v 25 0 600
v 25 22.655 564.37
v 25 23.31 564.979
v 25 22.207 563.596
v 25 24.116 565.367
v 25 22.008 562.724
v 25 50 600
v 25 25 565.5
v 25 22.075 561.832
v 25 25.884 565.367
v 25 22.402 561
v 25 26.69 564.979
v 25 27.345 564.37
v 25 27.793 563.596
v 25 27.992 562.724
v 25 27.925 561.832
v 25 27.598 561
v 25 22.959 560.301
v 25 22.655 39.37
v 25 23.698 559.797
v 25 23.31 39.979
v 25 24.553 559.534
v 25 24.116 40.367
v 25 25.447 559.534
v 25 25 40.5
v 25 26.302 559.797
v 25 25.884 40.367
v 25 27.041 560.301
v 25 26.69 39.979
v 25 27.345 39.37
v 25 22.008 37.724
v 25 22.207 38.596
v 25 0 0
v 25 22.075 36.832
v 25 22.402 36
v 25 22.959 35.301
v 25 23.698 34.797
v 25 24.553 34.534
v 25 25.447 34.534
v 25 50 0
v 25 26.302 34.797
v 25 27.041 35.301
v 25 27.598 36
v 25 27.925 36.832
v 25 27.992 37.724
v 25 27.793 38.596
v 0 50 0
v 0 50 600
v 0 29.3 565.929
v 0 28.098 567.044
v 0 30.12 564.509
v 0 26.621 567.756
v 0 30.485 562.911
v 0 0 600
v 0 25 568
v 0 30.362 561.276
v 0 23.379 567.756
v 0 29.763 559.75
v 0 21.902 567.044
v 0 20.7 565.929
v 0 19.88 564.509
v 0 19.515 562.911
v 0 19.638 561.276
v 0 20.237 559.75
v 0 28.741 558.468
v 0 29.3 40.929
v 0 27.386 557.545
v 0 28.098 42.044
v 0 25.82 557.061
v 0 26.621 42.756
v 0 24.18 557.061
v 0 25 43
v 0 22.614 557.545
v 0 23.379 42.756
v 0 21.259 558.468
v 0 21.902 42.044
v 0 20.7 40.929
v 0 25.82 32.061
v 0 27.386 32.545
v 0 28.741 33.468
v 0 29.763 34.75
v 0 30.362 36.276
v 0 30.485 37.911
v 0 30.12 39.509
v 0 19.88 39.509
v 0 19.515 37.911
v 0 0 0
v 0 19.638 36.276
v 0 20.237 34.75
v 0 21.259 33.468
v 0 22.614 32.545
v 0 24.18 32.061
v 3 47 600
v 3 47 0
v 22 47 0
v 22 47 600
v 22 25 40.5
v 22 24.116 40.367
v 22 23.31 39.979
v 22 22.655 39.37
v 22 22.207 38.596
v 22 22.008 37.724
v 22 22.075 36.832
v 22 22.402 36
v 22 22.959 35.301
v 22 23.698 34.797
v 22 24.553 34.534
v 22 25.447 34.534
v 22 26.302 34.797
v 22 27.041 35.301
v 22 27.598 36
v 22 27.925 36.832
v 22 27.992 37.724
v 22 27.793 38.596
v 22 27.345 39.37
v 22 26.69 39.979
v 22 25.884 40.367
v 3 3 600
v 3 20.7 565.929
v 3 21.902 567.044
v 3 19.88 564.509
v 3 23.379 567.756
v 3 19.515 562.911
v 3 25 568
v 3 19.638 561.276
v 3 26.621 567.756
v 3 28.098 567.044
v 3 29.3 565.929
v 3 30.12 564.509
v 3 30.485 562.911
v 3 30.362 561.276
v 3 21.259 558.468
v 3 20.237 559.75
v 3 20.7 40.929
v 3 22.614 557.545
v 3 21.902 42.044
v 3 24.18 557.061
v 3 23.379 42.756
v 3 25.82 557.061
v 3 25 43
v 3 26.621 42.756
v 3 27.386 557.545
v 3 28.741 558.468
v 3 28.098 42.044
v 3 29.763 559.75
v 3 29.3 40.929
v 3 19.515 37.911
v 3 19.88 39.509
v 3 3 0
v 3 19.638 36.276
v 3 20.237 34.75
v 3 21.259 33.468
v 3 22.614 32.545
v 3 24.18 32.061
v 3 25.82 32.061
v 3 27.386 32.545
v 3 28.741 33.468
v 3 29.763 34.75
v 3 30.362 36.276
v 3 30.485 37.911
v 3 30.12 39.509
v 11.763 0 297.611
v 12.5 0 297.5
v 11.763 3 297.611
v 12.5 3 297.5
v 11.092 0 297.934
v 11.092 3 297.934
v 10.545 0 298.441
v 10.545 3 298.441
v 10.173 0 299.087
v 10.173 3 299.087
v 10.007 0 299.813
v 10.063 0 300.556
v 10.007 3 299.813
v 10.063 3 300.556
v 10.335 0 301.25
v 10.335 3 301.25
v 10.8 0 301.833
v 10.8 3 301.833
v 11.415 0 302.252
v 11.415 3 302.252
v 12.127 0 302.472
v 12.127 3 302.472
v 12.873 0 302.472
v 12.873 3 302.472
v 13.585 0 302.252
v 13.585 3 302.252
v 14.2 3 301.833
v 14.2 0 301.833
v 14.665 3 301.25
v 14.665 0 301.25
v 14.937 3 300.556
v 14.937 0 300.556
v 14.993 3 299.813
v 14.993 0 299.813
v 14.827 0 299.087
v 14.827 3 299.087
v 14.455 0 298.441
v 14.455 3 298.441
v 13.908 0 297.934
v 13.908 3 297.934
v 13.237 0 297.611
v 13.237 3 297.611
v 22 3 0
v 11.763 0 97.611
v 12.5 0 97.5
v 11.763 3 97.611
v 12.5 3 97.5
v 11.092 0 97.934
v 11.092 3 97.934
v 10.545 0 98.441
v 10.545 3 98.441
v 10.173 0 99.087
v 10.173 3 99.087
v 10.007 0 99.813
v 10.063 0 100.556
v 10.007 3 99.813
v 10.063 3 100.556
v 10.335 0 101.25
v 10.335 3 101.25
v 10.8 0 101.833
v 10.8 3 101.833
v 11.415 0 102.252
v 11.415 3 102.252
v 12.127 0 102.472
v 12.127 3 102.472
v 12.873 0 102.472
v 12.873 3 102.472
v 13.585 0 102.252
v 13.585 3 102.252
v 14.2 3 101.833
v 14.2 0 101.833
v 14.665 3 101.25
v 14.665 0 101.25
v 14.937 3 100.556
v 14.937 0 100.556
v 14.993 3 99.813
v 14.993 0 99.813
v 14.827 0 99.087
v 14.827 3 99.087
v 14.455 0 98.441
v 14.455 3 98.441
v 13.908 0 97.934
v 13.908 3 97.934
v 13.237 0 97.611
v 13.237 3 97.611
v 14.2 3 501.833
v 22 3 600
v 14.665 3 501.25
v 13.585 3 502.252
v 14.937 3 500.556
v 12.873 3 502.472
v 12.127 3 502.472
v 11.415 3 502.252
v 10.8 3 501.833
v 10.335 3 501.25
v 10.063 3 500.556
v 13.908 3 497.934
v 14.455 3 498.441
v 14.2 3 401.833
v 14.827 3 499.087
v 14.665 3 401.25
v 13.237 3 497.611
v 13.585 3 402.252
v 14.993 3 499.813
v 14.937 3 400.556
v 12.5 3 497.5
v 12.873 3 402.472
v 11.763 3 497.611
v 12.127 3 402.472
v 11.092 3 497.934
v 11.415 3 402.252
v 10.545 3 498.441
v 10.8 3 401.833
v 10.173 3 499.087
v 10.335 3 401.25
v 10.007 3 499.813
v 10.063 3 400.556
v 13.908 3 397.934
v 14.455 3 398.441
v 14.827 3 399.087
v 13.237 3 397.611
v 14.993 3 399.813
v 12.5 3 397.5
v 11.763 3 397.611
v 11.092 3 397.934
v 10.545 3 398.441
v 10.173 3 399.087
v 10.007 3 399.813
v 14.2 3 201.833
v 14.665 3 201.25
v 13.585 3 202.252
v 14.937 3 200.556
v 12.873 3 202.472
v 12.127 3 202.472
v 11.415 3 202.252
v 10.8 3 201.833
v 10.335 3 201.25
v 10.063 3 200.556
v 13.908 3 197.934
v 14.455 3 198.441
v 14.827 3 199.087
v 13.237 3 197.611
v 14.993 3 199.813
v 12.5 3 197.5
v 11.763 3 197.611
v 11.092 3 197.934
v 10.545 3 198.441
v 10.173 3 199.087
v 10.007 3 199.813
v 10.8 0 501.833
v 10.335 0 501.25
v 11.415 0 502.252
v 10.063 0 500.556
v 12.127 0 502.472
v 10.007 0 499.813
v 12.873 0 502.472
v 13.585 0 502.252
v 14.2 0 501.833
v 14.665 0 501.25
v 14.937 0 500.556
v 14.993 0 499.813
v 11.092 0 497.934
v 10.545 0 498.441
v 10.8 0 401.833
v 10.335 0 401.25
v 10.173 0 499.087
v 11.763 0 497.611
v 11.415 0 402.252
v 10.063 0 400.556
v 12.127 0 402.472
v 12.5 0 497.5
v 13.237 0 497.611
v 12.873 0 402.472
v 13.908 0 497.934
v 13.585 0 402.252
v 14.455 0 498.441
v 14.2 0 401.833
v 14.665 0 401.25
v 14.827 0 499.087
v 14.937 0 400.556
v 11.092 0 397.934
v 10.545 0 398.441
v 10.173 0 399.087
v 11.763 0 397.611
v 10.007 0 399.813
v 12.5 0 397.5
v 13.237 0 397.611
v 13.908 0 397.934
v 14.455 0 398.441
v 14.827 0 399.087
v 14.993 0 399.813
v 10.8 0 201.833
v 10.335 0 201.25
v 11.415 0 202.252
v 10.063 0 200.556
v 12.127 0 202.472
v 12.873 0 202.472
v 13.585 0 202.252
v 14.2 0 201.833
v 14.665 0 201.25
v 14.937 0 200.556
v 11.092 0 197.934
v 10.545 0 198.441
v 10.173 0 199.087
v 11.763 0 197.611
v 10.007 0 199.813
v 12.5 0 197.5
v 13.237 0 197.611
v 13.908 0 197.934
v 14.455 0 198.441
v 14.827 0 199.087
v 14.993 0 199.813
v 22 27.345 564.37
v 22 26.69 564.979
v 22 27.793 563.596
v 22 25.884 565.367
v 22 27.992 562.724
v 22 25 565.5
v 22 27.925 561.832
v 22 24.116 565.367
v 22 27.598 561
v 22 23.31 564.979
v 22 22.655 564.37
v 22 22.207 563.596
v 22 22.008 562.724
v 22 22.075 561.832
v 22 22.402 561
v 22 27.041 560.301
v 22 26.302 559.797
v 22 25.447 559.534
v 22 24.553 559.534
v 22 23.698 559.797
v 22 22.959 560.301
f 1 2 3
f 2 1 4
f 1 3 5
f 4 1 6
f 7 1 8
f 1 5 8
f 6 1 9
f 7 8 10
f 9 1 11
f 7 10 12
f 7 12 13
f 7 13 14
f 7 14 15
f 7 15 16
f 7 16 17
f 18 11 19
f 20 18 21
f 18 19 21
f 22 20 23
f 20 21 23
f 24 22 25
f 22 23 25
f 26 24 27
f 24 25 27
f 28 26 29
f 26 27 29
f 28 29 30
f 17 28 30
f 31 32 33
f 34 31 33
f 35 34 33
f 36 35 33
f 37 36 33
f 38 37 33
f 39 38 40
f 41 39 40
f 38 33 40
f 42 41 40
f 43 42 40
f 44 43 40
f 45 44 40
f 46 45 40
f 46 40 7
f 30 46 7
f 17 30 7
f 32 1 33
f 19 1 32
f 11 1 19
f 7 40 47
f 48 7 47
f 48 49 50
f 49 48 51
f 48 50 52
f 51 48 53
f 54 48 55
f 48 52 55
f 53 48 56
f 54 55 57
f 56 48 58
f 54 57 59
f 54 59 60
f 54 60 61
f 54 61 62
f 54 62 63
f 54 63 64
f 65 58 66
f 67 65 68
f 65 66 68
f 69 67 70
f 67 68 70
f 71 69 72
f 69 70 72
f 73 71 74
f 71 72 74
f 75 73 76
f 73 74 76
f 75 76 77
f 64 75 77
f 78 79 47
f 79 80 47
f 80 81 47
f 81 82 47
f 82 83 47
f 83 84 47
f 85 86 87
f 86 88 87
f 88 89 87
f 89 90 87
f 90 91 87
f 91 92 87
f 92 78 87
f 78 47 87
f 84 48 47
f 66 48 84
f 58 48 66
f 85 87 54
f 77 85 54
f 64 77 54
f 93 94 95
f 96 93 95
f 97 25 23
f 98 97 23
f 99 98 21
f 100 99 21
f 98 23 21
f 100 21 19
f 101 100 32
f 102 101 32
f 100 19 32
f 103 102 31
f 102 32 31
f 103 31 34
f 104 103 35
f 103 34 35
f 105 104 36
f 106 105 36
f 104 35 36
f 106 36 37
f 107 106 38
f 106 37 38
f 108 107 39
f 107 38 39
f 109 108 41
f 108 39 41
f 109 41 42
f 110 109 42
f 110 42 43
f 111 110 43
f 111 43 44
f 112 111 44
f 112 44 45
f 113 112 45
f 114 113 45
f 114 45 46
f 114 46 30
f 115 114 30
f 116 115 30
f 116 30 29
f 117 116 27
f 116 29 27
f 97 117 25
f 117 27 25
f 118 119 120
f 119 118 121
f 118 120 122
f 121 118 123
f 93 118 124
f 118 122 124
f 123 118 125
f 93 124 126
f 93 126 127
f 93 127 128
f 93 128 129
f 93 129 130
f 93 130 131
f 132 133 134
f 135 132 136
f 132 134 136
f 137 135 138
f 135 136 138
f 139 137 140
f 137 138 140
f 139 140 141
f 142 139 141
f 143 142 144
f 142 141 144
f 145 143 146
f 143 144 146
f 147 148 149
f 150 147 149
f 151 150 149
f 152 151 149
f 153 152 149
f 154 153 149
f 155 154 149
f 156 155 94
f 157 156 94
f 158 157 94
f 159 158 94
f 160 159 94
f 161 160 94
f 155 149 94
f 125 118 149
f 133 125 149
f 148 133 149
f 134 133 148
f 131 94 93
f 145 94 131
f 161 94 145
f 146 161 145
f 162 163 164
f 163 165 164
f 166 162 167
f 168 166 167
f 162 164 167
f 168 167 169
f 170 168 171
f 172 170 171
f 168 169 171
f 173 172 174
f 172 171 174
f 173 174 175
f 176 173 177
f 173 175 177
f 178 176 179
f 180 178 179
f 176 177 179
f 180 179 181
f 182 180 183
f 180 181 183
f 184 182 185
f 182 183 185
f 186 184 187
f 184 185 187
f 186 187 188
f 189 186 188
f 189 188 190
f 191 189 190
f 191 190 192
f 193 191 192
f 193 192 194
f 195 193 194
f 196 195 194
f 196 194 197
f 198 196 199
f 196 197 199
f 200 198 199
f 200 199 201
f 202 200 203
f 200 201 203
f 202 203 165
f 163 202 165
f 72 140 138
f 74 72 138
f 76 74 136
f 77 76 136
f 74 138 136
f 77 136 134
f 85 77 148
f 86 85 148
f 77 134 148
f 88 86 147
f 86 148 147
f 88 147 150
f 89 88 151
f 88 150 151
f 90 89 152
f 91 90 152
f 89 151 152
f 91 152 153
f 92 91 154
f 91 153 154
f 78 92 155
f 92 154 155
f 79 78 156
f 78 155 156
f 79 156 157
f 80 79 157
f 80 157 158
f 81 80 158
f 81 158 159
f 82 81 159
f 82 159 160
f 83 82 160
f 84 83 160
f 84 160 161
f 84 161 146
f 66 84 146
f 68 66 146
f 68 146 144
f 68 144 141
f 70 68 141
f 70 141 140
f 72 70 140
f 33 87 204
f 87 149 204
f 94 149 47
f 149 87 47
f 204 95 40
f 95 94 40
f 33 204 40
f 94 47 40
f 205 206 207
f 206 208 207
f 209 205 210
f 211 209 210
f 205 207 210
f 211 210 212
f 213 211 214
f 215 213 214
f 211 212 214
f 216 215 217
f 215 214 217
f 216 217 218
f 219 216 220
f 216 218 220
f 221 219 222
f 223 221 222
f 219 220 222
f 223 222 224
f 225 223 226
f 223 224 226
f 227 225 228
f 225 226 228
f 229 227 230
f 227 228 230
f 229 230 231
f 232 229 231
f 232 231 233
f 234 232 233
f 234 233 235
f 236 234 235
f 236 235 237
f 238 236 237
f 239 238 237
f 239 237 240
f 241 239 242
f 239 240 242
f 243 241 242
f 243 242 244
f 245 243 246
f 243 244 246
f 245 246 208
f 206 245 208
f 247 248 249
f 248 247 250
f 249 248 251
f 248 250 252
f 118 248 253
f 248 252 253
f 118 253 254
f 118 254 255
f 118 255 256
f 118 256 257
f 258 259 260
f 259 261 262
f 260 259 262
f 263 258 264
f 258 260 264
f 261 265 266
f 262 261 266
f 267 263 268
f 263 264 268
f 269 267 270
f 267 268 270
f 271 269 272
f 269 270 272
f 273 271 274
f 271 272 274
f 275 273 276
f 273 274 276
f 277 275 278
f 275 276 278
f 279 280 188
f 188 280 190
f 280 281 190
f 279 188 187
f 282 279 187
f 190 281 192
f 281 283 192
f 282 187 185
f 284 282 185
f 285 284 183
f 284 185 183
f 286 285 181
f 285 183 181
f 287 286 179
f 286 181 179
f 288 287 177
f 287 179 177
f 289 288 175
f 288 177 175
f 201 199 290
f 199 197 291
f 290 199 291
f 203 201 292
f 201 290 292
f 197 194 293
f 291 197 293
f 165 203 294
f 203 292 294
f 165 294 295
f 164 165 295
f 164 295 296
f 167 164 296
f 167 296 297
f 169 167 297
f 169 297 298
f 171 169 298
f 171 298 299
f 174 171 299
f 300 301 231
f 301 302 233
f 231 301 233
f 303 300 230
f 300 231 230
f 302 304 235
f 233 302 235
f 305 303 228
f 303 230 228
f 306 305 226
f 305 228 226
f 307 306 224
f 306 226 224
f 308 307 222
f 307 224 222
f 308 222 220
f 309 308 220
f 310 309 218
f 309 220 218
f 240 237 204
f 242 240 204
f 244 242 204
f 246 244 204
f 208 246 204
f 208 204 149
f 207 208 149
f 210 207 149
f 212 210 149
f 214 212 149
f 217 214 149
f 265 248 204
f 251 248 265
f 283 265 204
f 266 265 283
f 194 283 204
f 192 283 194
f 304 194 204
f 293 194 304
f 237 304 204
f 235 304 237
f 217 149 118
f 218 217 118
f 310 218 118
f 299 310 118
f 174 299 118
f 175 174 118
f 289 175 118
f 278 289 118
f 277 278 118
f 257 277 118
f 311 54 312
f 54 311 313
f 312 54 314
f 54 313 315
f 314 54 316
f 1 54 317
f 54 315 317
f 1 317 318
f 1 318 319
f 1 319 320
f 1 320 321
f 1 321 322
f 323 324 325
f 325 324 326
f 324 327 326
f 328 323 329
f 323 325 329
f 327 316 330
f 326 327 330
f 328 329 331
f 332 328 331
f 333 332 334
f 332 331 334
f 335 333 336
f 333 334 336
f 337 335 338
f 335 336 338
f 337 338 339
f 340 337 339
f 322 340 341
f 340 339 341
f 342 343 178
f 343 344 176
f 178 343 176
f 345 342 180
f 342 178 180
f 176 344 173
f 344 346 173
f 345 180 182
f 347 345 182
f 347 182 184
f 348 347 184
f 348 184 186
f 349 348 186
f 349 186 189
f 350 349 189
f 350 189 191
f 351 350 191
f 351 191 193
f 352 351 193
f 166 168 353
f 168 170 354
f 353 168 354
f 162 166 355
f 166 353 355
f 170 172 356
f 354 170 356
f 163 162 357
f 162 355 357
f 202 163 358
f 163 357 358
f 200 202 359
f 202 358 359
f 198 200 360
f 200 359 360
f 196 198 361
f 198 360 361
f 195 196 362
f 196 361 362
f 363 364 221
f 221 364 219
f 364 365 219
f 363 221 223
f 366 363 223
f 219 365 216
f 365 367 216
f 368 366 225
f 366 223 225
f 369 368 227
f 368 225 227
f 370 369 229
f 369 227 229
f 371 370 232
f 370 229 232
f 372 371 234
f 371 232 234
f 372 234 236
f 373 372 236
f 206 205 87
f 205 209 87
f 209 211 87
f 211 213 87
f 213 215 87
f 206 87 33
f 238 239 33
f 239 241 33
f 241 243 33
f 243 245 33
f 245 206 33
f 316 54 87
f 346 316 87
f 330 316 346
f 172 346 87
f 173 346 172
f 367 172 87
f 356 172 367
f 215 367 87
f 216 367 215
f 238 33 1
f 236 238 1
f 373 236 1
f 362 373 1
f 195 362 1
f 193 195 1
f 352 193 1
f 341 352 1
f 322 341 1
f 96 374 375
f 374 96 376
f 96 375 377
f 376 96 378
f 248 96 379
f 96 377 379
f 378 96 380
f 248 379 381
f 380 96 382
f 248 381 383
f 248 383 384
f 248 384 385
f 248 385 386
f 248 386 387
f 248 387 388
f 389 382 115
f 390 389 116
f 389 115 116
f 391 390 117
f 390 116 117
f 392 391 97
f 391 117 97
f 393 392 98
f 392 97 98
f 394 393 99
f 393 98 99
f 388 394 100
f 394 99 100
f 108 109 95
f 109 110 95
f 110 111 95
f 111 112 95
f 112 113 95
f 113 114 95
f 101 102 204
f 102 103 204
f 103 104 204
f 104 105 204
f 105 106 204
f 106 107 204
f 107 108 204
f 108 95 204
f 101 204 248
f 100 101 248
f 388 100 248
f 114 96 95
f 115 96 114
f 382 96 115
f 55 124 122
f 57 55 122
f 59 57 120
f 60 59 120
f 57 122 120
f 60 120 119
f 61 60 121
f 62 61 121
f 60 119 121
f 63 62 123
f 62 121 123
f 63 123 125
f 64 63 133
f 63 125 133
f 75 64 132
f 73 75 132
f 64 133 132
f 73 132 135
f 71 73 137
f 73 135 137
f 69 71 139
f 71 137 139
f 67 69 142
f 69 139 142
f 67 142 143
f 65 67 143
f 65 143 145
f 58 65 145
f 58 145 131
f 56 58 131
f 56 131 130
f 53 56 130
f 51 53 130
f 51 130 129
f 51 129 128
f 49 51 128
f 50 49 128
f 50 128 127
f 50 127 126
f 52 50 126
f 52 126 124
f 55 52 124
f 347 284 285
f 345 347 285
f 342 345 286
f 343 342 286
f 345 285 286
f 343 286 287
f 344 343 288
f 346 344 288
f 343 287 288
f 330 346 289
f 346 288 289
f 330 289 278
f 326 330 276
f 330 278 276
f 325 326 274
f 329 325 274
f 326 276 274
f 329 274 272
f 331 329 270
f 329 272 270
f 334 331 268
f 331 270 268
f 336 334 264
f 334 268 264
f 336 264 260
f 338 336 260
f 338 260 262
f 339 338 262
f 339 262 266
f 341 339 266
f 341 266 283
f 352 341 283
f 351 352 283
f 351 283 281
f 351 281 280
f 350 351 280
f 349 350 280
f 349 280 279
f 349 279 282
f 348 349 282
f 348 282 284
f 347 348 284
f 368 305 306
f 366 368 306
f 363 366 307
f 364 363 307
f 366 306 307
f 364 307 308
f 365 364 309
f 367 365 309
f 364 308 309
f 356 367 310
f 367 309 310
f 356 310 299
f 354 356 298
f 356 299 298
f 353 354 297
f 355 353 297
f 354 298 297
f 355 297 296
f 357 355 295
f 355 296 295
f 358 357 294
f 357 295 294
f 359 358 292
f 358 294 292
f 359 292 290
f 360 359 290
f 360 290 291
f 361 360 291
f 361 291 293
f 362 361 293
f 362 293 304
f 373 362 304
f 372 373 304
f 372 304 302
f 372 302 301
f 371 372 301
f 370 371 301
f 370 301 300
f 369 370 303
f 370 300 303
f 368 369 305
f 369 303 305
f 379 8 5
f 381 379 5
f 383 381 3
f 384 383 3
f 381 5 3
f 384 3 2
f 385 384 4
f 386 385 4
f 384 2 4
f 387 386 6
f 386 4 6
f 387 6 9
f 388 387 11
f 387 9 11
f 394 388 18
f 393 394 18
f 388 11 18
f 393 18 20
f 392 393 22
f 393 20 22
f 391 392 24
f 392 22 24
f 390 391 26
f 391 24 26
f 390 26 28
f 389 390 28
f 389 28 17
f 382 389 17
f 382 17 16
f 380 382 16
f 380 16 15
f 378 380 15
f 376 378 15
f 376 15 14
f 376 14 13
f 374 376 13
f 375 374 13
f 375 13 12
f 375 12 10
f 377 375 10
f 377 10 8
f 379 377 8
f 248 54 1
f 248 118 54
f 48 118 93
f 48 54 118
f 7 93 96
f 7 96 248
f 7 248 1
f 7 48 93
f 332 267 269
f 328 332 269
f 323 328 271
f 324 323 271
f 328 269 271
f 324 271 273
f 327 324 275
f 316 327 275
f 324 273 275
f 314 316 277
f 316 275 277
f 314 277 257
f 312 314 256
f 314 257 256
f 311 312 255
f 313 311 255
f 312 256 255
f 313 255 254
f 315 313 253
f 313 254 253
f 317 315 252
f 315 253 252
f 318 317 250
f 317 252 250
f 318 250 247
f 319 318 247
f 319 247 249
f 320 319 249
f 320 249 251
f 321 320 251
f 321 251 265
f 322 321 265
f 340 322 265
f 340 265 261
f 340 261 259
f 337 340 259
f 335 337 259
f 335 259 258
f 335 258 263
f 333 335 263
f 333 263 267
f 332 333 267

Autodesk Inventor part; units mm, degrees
ref_plane "YZ Plane" through (0, 0, 0) normal (1, 0, 0) x (0, 1, 0)
ref_plane "XZ Plane" through (0, 0, 0) normal (0, 1, 0) x (-1, 0, 0)
ref_plane "XY Plane" through (0, 0, 0) normal (0, 0, 1) x (1, 0, 0)
sketch "Sketch1" plane through (0, 0, 0) normal (0, 0, 1) x (1, 0, 0)
  line L0 (0, 0) -> (25, 0)
  line L1 (25, 0) -> (25, 50)
  line L2 (25, 50) -> (0, 50)
  line L3 (0, 50) -> (0, 0)
  line L4 (22, 47) -> (22, 3)
  line L5 (22, 3) -> (3, 3)
  line L6 (3, 3) -> (3, 47)
  line L7 (3, 47) -> (22, 47)
  dimension "d0" = 25
  dimension "d1" = 50
  dimension "d2" = 3
extrude "Extrusion1" add sketch "Sketch1" along normal blind 600
sketch "Sketch2" plane through (0, 0, 0) normal (1, 0, 0) x (0, 0, -1)
  line L0 (0, 0) -> (-600, 0) projected
  line L1 (-600, 0) -> (-600, 50) projected
  point P0 (-562.5, 25)
  point P1 (-37.5, 25)
  dimension "d5" = 25
  dimension "d6" = 37.5
  dimension "d7" = 37.5
hole "Hole1" at (0, 25, 562.5) at (0, 25, 37.5) direction (1, 0, 0) diameter 6 end through all counterbore diameter 11 counterbore depth 5
sketch "Sketch3" plane through (0, 0, 0) normal (0, -1, 0) x (1, 0, 0)
  line L0 (0, 0) -> (25, 0) projected
  line L1 (0, 0) -> (0, 600) projected
  point P0 (12.5, 100)
  point P1 (12.5, 200)
  point P2 (12.5, 300)
  point P3 (12.5, 400)
  point P4 (12.5, 500)
  dimension "d15" = 100
  dimension "d16" = 12.5
  dimension "d19" = 100
hole "Hole2" at (12.5, 0, 100) at (12.5, 0, 200) at (12.5, 0, 300) at (12.5, 0, 400) at (12.5, 0, 500) direction (0, 1, 0) diameter 5 depth 8 tip angle 118
properties part number "Front Bar"
